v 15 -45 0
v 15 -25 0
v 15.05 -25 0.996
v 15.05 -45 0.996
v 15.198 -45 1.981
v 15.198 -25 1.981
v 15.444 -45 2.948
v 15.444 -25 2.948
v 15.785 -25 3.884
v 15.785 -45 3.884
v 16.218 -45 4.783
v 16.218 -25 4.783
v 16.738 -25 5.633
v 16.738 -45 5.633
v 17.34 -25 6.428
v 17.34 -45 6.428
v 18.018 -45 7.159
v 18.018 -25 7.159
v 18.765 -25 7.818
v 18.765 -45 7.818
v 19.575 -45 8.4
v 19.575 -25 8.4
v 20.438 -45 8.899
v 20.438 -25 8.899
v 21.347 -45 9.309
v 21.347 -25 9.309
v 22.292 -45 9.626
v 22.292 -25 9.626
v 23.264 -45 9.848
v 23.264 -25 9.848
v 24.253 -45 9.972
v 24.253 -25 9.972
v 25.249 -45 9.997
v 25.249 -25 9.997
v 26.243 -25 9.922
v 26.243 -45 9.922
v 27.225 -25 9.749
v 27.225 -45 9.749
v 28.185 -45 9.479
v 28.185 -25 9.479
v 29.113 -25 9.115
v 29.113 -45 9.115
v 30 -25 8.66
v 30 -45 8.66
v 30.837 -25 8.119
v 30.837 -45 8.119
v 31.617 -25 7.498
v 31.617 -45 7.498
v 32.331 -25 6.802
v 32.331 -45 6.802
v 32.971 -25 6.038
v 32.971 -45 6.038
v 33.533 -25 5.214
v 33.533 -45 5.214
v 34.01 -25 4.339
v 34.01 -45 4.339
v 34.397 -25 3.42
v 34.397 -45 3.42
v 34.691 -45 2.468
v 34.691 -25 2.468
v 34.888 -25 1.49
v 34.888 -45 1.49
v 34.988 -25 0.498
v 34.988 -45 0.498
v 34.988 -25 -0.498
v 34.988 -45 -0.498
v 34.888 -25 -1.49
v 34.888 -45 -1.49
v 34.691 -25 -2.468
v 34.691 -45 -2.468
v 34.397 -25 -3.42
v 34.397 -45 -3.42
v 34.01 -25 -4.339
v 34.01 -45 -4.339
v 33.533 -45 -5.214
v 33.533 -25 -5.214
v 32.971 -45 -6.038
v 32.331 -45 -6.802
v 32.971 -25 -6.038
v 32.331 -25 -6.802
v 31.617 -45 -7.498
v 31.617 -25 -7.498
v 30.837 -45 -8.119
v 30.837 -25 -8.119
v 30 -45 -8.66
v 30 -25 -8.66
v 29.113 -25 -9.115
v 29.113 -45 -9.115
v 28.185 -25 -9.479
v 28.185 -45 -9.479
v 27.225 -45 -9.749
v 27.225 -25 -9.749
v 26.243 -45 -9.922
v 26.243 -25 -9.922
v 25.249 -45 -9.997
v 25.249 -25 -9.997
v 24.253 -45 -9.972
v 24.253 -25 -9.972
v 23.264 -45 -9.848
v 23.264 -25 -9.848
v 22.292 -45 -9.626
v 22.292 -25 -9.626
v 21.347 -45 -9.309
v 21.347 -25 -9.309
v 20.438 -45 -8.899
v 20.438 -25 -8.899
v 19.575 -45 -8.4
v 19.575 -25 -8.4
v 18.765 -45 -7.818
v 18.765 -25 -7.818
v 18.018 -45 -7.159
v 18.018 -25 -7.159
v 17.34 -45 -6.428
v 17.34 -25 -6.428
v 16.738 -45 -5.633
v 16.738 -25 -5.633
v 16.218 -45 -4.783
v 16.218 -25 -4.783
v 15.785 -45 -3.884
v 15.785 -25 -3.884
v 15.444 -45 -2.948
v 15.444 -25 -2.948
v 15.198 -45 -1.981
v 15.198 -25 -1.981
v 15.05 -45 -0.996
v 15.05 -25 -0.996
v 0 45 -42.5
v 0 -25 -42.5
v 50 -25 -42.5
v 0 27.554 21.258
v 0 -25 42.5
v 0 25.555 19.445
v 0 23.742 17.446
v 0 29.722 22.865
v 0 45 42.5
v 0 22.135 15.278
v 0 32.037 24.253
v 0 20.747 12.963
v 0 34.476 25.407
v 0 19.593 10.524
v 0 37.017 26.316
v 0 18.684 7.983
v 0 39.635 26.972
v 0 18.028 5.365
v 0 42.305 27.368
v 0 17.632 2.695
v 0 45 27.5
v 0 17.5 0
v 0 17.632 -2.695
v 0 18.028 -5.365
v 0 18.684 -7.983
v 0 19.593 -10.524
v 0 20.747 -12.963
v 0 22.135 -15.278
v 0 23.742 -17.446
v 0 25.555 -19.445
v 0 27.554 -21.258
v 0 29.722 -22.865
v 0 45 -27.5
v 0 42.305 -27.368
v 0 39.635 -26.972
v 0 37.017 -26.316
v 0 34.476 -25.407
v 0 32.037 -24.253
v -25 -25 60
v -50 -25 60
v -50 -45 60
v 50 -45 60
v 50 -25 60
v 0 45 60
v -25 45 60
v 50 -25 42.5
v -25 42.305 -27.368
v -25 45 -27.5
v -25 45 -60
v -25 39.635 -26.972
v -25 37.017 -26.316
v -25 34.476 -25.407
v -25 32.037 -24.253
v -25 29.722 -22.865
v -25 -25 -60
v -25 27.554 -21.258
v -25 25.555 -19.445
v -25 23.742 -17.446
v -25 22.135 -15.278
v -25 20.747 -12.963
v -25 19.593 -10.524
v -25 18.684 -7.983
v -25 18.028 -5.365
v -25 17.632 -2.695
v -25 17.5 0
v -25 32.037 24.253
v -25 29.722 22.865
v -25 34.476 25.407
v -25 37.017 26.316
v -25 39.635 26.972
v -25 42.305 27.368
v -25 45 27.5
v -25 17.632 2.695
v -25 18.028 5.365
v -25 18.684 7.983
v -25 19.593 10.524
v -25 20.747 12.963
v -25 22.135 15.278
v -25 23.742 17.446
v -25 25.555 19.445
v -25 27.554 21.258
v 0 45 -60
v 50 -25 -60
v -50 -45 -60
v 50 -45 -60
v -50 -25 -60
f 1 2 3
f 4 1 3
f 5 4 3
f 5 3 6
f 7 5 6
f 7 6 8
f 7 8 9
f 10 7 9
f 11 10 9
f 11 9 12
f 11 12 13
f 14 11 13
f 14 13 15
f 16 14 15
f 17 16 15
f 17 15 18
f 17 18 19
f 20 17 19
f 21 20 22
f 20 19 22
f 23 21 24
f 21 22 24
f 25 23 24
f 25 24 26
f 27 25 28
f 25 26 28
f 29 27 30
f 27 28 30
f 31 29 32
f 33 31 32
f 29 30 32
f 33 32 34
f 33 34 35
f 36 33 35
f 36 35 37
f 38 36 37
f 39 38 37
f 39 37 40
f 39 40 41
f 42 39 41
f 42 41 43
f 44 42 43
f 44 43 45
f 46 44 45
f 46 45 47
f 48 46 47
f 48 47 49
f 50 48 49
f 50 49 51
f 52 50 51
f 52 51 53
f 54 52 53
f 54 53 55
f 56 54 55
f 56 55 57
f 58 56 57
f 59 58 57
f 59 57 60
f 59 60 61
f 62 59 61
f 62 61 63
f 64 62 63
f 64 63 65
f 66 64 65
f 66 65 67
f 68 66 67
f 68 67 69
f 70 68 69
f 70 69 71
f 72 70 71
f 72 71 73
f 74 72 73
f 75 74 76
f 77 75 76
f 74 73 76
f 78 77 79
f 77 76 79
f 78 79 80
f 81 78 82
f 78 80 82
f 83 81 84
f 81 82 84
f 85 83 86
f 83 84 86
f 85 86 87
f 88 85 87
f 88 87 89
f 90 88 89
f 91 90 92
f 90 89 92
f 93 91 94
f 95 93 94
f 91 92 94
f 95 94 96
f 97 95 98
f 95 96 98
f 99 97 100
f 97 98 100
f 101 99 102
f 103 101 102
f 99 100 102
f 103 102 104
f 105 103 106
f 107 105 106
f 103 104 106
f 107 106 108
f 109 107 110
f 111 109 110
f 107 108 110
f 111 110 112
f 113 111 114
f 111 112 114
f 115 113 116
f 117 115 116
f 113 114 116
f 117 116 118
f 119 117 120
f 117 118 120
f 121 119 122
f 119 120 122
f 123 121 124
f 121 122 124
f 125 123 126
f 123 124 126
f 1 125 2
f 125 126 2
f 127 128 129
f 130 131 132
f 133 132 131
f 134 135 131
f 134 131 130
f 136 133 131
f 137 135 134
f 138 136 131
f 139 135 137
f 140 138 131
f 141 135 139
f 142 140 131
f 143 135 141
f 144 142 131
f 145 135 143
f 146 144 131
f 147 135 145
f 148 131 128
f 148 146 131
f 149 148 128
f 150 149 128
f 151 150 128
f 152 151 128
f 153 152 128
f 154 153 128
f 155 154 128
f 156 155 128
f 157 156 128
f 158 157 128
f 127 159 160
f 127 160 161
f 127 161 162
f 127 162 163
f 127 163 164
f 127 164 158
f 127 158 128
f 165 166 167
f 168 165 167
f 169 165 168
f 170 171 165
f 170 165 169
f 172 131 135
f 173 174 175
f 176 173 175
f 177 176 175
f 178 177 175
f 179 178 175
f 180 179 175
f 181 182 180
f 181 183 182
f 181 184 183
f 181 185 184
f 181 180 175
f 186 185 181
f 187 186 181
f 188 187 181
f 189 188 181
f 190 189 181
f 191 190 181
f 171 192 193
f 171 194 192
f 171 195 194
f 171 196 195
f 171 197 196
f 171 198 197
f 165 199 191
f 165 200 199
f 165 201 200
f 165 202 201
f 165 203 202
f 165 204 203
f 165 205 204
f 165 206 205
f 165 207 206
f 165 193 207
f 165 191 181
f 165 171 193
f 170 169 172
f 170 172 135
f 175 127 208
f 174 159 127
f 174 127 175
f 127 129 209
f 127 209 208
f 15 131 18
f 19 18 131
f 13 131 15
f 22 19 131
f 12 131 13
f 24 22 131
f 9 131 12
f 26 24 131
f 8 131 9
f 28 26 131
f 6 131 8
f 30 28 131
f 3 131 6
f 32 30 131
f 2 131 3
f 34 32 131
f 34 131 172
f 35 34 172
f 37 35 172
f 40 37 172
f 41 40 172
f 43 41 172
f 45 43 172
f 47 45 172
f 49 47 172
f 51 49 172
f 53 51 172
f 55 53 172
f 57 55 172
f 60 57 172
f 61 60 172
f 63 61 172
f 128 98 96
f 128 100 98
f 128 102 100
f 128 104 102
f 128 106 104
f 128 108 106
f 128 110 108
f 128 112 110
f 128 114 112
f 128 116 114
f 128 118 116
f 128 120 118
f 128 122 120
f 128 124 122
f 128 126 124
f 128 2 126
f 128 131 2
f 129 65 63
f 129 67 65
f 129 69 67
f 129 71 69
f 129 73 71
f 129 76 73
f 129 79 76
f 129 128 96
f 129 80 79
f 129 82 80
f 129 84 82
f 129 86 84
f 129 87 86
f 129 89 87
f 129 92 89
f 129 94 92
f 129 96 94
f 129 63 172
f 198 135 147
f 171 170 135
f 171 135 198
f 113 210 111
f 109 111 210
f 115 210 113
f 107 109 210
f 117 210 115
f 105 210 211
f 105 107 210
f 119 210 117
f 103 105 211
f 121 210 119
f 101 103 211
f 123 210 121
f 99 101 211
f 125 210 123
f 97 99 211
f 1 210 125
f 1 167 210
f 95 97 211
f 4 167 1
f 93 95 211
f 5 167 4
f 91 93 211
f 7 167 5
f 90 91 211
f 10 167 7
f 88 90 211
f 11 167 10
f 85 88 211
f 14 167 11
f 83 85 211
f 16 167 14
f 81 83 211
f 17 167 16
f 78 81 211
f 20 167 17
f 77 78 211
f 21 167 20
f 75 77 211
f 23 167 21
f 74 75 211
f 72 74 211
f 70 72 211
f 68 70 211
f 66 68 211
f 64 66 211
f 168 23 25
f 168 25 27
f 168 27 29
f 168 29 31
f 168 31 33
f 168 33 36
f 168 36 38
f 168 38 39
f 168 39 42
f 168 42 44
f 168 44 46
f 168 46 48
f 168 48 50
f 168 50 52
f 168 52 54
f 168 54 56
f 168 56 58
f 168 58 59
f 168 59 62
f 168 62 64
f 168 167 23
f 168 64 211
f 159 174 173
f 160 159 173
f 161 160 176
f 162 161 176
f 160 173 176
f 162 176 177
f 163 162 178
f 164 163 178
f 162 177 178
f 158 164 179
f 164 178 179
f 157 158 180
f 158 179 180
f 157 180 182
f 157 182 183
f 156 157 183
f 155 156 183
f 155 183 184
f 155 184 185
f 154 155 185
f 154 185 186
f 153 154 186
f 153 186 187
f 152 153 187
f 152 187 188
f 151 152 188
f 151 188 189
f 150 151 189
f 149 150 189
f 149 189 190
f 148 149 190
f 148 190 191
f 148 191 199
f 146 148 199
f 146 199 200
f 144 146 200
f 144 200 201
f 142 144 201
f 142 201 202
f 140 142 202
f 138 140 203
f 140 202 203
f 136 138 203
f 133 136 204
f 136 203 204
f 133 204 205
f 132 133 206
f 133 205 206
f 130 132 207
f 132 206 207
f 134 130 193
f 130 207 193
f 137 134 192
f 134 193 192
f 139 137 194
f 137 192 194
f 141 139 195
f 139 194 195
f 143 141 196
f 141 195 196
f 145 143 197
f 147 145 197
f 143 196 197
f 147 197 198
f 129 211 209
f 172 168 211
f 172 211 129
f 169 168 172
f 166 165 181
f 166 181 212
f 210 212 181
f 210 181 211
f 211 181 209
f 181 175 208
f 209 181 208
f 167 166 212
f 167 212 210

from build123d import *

# Parameters (mm, degrees)
EXTRUDE_1_DEPTH     = 60
SKETCH_2_W          = 50
SKETCH_2_H          = 85
CUT_EXTRUDE_1_DEPTH = 70
SKETCH_3_R          = 10
CUT_EXTRUDE_2_DEPTH = 105.880884817
SKETCH_4_R          = 27.5
CUT_EXTRUDE_3_DEPTH = 107.066017178


with BuildPart() as part:
    # Эскиз1 → Бобышка-Вытянуть1 (new, symmetric)
    with BuildSketch(Plane.XY):
        Polygon((50, -25), (0, 45), (-25, 45), (-25, -25), (-50, -25), (-50, -45), (50, -45), align=None)
    extrude(amount=EXTRUDE_1_DEPTH, both=True)

    # Эскиз2 → Вырез-Вытянуть1 (cut)
    with BuildSketch(Plane(origin=(0, 45, 0), x_dir=(1, 0, 0), z_dir=(0, 1, 0))):
        with Locations((25, 0)):
            Rectangle(SKETCH_2_W, SKETCH_2_H)
    extrude(amount=-CUT_EXTRUDE_1_DEPTH, mode=Mode.SUBTRACT)

    # Эскиз3 → Вырез-Вытянуть2 (cut, through all)
    with BuildSketch(Plane(origin=(0, -25, 0), x_dir=(1, 0, 0), z_dir=(0, 1, 0))):
        with Locations(Location((25, 0, 0), (0, 0, 180))):
            Circle(SKETCH_3_R)
    extrude(amount=-CUT_EXTRUDE_2_DEPTH, mode=Mode.SUBTRACT)

    # Эскиз4 → Вырез-Вытянуть3 (cut, through all)
    with BuildSketch(Plane.ZY.offset(25)):
        with Locations((0, 45)):
            Circle(SKETCH_4_R)
    extrude(amount=-CUT_EXTRUDE_3_DEPTH, mode=Mode.SUBTRACT)


solid = part.part
